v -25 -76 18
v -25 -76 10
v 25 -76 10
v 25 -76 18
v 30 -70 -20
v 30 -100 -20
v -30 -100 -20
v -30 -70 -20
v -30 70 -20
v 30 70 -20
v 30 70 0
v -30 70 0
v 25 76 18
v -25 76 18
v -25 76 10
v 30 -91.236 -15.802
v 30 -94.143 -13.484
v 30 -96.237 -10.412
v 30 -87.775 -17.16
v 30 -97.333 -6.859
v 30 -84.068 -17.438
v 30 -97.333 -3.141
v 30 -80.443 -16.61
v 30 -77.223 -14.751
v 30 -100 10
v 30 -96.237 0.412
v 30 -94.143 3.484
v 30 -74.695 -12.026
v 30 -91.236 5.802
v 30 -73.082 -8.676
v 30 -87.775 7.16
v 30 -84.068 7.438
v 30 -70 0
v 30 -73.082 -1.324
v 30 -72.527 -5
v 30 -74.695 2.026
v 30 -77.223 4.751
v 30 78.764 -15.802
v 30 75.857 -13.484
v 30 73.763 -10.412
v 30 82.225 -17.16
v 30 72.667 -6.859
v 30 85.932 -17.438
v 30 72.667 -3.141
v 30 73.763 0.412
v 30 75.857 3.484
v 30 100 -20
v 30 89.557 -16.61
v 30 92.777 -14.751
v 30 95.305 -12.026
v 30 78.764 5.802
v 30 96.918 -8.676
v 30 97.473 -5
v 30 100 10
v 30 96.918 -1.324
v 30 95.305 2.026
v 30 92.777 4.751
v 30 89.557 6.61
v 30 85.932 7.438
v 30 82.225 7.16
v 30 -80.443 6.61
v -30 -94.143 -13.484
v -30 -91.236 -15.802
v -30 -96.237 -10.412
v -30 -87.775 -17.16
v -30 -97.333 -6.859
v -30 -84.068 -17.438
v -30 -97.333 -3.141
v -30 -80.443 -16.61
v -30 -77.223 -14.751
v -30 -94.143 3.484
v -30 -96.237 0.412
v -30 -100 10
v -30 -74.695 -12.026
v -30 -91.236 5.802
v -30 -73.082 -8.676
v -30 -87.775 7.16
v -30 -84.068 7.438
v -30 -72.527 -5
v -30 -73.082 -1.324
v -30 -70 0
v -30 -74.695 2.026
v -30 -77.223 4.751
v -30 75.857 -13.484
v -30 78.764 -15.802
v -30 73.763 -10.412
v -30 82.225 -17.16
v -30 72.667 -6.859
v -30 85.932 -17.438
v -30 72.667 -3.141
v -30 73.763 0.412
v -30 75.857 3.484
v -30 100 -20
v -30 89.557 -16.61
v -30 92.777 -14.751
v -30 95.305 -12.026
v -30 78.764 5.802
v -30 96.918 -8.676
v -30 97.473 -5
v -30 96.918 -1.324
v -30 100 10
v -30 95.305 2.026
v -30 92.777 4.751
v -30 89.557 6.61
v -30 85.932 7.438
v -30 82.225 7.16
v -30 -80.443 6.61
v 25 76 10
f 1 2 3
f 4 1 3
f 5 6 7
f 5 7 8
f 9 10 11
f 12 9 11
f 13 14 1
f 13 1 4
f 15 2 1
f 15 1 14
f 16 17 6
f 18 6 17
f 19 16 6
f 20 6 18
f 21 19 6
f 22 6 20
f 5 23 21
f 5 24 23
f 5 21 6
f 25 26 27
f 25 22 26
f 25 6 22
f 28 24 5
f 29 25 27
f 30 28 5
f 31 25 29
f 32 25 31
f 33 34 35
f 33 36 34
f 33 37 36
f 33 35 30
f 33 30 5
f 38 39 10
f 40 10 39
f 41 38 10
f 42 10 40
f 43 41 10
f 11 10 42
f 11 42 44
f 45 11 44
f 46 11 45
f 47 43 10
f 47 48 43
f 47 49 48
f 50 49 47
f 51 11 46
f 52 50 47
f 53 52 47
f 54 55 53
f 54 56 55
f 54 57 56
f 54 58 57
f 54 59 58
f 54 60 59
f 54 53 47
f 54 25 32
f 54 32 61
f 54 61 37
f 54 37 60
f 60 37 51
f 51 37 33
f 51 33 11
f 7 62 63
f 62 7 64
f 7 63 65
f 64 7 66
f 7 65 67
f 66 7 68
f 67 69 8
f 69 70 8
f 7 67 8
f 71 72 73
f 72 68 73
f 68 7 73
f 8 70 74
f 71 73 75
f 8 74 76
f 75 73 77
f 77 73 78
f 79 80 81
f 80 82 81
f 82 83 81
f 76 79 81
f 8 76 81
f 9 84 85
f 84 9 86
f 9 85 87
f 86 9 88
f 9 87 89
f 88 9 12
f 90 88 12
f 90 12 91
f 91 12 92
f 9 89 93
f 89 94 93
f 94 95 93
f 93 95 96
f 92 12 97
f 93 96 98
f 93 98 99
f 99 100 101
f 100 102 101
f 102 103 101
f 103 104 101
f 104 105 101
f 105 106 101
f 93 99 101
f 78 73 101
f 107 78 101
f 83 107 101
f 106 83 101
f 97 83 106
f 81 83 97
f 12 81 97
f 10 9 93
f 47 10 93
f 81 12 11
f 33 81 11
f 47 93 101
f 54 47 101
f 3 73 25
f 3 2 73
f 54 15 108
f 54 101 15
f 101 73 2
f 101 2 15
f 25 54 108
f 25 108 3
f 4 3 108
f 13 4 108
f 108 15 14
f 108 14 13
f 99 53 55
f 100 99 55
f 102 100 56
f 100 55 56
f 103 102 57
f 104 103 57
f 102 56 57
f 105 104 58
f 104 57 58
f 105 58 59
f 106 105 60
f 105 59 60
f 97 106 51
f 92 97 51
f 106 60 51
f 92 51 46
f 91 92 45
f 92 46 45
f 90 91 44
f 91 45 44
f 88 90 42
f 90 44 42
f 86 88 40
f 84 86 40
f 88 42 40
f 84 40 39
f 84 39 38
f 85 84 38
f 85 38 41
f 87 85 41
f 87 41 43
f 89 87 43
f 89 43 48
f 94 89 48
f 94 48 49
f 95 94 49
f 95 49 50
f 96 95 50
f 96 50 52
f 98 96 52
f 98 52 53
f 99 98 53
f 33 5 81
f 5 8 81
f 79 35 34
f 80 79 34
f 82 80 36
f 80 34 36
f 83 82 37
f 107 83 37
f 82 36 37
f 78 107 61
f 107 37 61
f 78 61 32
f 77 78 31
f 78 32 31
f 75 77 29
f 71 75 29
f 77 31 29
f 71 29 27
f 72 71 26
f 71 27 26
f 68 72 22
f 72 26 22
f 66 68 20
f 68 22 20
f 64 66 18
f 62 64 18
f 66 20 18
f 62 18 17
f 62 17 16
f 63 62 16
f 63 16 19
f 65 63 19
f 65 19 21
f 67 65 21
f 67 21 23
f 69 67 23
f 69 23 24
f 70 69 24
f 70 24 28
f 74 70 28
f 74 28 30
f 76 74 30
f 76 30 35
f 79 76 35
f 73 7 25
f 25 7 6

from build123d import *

# Parameters (mm, degrees)
F0_W     = 60
F0_H     = 200
F1_DEPTH = 10
F2_W     = 30
F2_H     = 20
F3_DEPTH = 30
F4_W     = 50
F4_H     = 152
F5_DEPTH = 8
F6_R     = 12.472601
F7_DEPTH = 60.001


with BuildPart() as f1:
    # F0 (on Top) → F1 (new body)
    with BuildSketch(Plane.XY):
        Rectangle(F0_W, F0_H)
    extrude(amount=F1_DEPTH)

    # F2 (on Right) → F3 (join, symmetric)
    with BuildSketch(Plane.YZ):
        with Locations((-85, -10)):
            Rectangle(F2_W, F2_H)
        with Locations((85, -10)):
            Rectangle(F2_W, F2_H)
    extrude(amount=F3_DEPTH, both=True)

    # F4 (on face) → F5 (join)
    with BuildSketch(Plane.XY.offset(10)):
        Rectangle(F4_W, F4_H)
    extrude(amount=F5_DEPTH)

    # F6 (on face) → F7 (cut, through all)
    with BuildSketch(Plane.YZ.offset(30)):
        with Locations((-85, -5)):
            Circle(F6_R)
        with Locations((85, -5)):
            Circle(F6_R)
    extrude(amount=-F7_DEPTH, mode=Mode.SUBTRACT)


solid = f1.part
